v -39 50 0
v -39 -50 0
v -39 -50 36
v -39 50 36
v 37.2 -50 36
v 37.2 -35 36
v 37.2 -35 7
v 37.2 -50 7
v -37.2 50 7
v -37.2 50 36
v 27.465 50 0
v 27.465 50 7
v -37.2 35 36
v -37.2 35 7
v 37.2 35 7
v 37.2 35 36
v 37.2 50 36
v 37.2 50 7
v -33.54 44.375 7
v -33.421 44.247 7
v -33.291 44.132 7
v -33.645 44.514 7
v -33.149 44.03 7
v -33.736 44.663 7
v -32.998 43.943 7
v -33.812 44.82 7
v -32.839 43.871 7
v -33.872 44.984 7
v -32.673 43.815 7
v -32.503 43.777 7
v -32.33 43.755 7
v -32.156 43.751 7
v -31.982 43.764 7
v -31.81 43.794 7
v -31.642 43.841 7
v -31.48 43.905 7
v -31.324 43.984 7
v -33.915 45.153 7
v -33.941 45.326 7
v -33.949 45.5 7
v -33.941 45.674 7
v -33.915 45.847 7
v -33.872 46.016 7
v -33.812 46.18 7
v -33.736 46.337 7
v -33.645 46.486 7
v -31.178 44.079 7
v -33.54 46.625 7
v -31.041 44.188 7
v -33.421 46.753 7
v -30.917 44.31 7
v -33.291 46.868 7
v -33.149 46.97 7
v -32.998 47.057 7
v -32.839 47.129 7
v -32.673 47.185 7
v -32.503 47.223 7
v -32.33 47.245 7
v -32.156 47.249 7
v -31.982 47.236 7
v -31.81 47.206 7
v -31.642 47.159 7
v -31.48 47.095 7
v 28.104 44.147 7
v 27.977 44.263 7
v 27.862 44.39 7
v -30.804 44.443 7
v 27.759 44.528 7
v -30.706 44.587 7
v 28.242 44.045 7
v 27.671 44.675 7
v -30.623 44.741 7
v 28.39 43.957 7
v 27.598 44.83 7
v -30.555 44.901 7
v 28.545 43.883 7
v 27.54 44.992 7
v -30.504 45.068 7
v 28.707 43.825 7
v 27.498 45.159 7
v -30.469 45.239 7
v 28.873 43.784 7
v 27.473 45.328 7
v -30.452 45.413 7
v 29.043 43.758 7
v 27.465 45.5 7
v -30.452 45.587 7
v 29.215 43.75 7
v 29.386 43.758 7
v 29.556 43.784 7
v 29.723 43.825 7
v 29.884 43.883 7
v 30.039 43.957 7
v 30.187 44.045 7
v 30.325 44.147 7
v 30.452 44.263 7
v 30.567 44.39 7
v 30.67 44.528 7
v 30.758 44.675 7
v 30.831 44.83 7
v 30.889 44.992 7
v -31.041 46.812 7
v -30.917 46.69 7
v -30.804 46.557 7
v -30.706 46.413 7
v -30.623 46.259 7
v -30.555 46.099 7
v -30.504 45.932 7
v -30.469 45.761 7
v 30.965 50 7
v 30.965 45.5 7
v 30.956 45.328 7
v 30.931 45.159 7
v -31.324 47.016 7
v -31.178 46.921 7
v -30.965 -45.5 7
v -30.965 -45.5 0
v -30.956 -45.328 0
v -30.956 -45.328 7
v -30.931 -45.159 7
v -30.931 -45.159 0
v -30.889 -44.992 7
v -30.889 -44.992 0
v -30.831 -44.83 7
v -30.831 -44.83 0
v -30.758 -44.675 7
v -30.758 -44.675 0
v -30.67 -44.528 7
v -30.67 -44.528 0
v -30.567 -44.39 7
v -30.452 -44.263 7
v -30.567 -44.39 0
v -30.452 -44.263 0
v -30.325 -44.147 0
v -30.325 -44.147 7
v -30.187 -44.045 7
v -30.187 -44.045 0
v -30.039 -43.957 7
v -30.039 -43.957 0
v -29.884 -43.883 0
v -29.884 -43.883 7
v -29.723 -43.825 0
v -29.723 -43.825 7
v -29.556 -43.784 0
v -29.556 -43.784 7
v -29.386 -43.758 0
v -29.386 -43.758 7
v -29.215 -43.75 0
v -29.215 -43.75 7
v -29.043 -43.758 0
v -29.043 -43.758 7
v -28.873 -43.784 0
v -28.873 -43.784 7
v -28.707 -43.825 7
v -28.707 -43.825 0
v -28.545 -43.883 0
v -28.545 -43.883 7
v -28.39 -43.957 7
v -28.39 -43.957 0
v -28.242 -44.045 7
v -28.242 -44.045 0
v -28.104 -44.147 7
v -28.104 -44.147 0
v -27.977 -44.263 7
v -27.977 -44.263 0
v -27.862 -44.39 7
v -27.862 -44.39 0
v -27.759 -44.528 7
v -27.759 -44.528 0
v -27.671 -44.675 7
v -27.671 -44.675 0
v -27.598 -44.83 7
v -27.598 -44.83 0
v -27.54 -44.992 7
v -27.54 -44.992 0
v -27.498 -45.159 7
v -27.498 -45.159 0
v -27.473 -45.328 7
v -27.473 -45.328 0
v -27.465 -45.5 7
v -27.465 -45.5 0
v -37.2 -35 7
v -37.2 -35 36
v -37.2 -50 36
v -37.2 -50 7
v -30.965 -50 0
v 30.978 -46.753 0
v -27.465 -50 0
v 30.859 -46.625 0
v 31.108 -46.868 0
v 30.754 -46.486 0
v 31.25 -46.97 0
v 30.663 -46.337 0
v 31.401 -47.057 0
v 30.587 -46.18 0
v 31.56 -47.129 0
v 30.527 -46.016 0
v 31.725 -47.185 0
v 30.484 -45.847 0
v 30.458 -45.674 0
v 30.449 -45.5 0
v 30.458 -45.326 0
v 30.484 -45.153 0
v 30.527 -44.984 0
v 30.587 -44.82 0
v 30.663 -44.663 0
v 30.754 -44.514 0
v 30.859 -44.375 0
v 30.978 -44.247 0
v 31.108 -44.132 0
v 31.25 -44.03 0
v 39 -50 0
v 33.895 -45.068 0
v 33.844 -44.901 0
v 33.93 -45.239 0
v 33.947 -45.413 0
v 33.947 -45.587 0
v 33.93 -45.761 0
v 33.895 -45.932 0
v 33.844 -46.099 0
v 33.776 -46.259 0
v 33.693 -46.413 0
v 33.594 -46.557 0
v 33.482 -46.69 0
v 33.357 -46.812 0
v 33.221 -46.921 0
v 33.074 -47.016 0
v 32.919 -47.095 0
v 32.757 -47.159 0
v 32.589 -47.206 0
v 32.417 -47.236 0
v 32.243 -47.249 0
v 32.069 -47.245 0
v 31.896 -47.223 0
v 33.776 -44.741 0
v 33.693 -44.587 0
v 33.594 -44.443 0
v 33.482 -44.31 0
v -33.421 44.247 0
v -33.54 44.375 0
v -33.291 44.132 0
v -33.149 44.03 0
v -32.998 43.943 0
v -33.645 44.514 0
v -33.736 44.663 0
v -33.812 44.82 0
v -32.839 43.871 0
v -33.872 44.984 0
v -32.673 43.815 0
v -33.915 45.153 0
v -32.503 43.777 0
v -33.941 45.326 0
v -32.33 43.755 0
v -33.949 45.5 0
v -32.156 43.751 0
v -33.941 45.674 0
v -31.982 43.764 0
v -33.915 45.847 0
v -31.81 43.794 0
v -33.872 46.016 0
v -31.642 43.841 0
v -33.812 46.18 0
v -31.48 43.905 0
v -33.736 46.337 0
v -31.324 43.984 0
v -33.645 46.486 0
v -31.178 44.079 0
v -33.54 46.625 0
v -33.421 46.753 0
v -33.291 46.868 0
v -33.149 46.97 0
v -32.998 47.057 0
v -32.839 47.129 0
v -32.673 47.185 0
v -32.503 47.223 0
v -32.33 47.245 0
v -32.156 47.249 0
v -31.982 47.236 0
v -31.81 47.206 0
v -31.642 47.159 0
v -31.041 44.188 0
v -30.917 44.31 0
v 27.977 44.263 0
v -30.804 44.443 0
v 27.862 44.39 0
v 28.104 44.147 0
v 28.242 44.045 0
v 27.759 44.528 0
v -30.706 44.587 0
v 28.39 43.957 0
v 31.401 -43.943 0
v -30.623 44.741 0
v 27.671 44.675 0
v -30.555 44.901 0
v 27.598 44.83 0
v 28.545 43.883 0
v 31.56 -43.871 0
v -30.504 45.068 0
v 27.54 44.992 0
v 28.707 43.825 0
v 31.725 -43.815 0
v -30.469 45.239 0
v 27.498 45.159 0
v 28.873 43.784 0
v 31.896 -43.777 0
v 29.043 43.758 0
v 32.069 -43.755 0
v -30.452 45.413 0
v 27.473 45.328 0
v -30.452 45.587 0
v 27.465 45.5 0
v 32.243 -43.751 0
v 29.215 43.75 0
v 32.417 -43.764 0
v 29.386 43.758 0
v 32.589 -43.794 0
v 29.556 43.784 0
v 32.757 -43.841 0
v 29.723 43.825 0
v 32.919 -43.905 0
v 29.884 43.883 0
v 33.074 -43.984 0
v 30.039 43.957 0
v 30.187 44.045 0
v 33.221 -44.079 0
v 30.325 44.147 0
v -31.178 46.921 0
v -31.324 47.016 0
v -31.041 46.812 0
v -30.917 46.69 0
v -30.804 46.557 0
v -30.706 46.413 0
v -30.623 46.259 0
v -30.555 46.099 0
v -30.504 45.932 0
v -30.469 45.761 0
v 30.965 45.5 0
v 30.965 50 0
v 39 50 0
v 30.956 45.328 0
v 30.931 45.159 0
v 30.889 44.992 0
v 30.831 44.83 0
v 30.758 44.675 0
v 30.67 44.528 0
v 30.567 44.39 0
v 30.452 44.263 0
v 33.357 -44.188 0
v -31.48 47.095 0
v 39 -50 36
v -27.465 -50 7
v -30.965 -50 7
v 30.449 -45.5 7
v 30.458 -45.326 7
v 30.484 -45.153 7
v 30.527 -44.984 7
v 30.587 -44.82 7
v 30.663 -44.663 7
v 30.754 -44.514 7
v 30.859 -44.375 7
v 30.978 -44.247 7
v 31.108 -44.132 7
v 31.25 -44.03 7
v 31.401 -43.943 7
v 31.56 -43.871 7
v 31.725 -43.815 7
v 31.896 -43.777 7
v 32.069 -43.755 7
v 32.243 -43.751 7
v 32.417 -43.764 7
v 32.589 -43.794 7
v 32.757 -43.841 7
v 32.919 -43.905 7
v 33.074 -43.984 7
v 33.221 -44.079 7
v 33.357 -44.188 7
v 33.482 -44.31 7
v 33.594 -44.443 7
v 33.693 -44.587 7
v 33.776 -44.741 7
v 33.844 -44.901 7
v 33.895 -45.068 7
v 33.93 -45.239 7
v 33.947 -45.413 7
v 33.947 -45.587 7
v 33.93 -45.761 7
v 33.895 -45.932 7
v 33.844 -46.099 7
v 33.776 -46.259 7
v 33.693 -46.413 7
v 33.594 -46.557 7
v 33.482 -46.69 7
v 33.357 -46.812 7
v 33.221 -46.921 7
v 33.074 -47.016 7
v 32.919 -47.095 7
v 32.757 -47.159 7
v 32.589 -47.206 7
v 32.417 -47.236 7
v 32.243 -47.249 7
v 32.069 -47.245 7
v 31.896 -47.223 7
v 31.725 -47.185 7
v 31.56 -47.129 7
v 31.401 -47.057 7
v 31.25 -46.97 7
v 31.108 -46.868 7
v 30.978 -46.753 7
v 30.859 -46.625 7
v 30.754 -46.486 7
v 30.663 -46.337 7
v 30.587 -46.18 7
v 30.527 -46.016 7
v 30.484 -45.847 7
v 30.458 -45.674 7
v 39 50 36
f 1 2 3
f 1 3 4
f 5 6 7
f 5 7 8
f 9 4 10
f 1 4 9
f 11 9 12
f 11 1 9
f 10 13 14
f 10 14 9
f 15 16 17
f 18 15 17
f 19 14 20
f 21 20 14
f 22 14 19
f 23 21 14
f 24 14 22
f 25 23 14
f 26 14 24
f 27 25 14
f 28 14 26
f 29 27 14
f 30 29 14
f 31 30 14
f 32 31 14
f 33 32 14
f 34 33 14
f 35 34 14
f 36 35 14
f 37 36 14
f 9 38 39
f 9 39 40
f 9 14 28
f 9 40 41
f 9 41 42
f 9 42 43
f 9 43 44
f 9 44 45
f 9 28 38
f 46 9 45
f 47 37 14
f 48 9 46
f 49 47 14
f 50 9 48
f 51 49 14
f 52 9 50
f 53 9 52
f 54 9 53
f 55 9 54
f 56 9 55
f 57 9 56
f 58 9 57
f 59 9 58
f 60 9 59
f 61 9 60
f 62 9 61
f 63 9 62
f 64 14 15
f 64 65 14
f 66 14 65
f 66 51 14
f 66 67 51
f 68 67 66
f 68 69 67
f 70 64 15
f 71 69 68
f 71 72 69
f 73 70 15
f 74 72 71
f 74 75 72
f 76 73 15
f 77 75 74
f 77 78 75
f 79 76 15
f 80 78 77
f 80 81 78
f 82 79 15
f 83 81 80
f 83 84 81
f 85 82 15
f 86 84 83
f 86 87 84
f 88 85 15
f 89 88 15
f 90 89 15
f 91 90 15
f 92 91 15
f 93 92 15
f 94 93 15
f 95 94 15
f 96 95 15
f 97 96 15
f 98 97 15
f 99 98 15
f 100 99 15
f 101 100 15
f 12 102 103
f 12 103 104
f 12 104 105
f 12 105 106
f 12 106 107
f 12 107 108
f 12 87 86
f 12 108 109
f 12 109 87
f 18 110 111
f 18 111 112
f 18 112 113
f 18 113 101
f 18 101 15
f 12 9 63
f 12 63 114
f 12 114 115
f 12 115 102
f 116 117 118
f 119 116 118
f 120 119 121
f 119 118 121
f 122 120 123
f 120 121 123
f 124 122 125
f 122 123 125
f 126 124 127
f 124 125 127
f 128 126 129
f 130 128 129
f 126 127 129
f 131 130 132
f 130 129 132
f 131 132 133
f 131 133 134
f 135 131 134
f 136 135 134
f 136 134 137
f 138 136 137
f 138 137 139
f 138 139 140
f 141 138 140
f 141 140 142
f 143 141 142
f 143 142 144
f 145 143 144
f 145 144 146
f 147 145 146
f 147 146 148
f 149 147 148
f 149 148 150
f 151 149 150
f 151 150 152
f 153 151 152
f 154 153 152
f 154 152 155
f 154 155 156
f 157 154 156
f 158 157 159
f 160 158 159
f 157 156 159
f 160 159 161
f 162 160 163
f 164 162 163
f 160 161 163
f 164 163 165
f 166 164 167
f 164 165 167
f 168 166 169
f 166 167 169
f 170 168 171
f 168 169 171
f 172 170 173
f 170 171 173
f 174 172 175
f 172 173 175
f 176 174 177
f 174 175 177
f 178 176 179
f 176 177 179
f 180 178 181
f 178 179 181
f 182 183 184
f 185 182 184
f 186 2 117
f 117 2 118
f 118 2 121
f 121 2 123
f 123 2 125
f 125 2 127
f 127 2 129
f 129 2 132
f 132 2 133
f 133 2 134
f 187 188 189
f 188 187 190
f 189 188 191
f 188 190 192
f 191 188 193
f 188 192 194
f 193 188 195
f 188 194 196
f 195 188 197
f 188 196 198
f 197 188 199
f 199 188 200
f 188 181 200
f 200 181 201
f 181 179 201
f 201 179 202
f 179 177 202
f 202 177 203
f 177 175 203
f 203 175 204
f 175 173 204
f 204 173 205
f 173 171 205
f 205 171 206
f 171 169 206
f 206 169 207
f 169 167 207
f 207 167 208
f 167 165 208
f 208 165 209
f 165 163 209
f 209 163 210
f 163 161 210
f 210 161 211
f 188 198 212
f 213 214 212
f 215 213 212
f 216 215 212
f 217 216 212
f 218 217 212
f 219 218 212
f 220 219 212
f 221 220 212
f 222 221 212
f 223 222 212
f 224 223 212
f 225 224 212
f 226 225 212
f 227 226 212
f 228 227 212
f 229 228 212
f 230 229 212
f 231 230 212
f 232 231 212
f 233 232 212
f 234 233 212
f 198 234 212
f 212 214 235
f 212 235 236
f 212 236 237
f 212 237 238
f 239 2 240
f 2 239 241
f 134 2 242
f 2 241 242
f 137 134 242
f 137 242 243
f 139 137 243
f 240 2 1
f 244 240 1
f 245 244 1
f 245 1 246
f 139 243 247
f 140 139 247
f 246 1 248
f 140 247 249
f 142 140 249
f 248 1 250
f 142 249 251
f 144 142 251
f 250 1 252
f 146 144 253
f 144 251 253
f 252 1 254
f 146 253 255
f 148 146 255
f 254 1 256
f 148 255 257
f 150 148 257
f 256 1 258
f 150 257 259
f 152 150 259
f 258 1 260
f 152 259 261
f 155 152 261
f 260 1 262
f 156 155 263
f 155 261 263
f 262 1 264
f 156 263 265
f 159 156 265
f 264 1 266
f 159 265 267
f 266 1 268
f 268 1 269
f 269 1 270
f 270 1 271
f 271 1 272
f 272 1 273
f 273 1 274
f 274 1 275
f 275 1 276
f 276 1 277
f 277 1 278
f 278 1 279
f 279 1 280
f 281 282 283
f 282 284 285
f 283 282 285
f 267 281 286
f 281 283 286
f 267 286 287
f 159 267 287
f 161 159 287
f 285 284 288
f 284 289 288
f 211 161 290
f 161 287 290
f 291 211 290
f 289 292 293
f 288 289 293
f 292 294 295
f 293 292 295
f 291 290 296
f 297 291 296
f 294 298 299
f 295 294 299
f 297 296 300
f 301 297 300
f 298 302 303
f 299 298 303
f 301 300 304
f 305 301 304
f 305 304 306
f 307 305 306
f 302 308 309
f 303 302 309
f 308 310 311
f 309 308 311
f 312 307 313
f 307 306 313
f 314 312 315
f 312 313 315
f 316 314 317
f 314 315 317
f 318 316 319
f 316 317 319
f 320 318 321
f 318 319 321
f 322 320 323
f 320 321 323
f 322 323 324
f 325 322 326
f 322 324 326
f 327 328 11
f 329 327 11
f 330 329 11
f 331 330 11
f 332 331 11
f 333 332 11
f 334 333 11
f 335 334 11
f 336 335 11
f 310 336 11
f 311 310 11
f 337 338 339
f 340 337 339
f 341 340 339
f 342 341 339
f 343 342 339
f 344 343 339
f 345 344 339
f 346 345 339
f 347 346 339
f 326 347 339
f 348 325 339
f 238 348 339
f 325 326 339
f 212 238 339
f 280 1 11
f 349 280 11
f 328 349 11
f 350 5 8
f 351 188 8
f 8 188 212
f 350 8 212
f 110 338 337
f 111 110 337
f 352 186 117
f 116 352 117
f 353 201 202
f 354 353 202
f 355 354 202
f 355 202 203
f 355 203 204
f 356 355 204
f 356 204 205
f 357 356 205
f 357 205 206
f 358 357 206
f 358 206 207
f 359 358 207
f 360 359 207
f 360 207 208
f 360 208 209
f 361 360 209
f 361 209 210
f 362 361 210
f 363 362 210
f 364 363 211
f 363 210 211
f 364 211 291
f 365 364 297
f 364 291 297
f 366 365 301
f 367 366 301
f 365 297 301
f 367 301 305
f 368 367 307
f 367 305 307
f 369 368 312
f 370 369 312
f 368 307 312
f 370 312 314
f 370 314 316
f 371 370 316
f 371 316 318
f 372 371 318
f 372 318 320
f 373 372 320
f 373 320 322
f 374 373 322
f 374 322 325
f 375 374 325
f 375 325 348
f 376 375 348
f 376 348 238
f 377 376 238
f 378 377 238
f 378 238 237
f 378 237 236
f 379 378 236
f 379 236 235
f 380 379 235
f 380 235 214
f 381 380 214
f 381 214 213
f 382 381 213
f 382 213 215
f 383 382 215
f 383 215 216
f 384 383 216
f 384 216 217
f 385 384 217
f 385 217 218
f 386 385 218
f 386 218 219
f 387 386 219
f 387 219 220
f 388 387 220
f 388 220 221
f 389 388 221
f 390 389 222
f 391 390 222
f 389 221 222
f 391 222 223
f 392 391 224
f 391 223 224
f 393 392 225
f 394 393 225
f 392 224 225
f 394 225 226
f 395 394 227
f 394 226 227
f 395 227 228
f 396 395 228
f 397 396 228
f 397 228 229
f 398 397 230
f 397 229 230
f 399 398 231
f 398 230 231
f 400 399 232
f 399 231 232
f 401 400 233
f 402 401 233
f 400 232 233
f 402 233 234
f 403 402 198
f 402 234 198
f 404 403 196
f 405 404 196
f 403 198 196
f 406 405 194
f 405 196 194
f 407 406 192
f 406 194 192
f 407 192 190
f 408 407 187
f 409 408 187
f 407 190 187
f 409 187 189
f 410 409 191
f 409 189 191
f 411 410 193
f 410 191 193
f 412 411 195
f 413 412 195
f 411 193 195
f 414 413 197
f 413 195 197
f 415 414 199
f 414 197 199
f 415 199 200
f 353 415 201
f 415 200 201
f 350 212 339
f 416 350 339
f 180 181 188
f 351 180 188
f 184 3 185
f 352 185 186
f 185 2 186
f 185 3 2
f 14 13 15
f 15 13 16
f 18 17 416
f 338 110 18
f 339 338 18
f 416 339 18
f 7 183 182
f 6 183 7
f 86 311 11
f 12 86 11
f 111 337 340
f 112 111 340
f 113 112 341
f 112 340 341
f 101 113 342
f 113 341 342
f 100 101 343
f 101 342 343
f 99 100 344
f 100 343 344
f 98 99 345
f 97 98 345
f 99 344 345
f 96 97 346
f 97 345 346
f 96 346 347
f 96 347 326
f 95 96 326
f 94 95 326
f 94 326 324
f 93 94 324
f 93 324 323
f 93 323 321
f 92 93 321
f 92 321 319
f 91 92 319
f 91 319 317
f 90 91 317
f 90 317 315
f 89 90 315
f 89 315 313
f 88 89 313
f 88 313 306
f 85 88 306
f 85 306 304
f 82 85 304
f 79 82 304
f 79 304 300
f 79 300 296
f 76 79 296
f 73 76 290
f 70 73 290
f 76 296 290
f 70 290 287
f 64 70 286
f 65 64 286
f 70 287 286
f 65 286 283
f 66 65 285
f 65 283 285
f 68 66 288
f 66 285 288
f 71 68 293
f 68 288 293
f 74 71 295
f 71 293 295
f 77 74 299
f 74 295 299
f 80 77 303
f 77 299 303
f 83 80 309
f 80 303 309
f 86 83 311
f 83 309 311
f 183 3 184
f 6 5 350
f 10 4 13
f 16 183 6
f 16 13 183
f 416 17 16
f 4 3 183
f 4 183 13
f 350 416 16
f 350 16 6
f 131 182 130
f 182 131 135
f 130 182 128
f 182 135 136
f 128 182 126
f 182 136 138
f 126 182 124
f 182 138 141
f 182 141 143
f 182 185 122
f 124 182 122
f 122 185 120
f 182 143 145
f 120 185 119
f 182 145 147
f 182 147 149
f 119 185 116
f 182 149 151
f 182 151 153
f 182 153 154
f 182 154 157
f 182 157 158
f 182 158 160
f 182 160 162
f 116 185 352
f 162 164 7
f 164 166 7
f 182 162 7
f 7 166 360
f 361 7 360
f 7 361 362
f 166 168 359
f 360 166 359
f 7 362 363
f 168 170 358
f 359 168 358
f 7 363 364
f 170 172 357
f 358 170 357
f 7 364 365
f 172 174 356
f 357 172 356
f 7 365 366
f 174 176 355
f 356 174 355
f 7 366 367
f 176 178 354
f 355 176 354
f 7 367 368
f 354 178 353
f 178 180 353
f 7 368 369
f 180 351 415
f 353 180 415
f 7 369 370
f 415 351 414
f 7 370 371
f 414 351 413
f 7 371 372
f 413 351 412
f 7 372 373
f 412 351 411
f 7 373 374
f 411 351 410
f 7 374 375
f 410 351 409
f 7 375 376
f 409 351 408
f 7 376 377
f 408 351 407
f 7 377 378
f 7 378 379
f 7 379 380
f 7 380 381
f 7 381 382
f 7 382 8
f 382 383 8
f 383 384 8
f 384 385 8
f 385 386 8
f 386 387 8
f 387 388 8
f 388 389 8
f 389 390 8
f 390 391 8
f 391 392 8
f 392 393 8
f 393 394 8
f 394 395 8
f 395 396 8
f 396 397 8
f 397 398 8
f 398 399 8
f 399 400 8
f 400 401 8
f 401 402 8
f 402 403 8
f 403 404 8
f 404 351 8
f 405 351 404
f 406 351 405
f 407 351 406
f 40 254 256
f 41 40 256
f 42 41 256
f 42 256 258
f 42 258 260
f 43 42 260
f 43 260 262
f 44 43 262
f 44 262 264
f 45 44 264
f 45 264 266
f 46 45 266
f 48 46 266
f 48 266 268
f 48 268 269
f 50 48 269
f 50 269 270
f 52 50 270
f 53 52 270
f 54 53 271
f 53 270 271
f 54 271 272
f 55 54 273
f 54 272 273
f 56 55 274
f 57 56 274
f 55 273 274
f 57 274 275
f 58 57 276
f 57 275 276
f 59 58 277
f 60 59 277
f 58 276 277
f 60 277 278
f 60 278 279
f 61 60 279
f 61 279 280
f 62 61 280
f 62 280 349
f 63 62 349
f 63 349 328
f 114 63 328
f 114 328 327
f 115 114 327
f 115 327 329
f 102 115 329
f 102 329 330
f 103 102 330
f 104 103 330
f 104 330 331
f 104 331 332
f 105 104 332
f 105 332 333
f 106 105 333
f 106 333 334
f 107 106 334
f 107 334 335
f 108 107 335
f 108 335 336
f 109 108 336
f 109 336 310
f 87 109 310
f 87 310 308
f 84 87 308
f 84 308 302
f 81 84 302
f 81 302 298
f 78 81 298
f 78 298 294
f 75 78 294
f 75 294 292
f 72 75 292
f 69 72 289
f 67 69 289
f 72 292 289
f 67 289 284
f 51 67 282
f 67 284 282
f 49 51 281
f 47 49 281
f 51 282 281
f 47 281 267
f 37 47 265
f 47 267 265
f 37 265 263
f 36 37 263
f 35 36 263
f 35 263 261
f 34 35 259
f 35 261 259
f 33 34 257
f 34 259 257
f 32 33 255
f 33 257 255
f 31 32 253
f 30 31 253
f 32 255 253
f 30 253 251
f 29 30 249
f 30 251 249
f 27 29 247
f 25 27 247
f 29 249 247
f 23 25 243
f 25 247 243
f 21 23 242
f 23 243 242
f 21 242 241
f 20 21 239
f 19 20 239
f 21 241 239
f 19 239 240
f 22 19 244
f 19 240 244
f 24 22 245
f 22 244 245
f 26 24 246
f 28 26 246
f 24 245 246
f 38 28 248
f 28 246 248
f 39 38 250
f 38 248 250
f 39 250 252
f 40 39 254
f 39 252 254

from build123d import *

# Parameters (mm, degrees)
SKETCH_1_W          = 78
SKETCH_1_H          = 100
EXTRUDE_1_DEPTH     = 36
SKETCH_2_W          = 74.4
SKETCH_2_H          = 15
CUT_EXTRUDE_1_DEPTH = 29
SKETCH_4_R          = 1.75
CUT_EXTRUDE_2_DEPTH = 10


with BuildPart() as part:
    # 草图1 → 凸台-拉伸1 (new body)
    with BuildSketch(Plane.XY):
        Rectangle(SKETCH_1_W, SKETCH_1_H)
    extrude(amount=EXTRUDE_1_DEPTH)

    # 草图2 → 切除-拉伸1 (cut)
    with BuildSketch(Plane.XY.offset(36)):
        with Locations((0, 42.5)):
            Rectangle(SKETCH_2_W, SKETCH_2_H)
    cut_extrude_1 = extrude(amount=-CUT_EXTRUDE_1_DEPTH, mode=Mode.SUBTRACT)

    # 草图4 → 切除-拉伸2 (cut)
    with BuildSketch(Plane(origin=(0, 0, 0), x_dir=(-1, 0, 0), z_dir=(0, 0, -1))):
        with Locations((-32.199434729, -45.5)):
            Circle(SKETCH_4_R)
        with Locations((32.199434729, 45.5)):
            Circle(SKETCH_4_R)
        with BuildLine():
            Line((27.464507609, -45.5), (27.464507609, -50))
            Line((27.464507609, -50), (30.964507609, -50))
            Line((30.964507609, -50), (30.964507609, -45.5))
            ThreePointArc((30.964507609, -45.5), (29.214507609, -43.75), (27.464507609, -45.5))
        make_face()
        with BuildLine():
            Line((-27.464507609, 45.5), (-27.464507609, 50))
            Line((-27.464507609, 50), (-30.964507609, 50))
            Line((-30.964507609, 50), (-30.964507609, 45.5))
            ThreePointArc((-30.964507609, 45.5), (-29.214507609, 43.75), (-27.464507609, 45.5))
        make_face()
    extrude(amount=-CUT_EXTRUDE_2_DEPTH, mode=Mode.SUBTRACT)

    # 镜向1: 切除-拉伸1 across plane
    add(cut_extrude_1.mirror(Plane.ZX), mode=Mode.SUBTRACT)


solid = part.part
